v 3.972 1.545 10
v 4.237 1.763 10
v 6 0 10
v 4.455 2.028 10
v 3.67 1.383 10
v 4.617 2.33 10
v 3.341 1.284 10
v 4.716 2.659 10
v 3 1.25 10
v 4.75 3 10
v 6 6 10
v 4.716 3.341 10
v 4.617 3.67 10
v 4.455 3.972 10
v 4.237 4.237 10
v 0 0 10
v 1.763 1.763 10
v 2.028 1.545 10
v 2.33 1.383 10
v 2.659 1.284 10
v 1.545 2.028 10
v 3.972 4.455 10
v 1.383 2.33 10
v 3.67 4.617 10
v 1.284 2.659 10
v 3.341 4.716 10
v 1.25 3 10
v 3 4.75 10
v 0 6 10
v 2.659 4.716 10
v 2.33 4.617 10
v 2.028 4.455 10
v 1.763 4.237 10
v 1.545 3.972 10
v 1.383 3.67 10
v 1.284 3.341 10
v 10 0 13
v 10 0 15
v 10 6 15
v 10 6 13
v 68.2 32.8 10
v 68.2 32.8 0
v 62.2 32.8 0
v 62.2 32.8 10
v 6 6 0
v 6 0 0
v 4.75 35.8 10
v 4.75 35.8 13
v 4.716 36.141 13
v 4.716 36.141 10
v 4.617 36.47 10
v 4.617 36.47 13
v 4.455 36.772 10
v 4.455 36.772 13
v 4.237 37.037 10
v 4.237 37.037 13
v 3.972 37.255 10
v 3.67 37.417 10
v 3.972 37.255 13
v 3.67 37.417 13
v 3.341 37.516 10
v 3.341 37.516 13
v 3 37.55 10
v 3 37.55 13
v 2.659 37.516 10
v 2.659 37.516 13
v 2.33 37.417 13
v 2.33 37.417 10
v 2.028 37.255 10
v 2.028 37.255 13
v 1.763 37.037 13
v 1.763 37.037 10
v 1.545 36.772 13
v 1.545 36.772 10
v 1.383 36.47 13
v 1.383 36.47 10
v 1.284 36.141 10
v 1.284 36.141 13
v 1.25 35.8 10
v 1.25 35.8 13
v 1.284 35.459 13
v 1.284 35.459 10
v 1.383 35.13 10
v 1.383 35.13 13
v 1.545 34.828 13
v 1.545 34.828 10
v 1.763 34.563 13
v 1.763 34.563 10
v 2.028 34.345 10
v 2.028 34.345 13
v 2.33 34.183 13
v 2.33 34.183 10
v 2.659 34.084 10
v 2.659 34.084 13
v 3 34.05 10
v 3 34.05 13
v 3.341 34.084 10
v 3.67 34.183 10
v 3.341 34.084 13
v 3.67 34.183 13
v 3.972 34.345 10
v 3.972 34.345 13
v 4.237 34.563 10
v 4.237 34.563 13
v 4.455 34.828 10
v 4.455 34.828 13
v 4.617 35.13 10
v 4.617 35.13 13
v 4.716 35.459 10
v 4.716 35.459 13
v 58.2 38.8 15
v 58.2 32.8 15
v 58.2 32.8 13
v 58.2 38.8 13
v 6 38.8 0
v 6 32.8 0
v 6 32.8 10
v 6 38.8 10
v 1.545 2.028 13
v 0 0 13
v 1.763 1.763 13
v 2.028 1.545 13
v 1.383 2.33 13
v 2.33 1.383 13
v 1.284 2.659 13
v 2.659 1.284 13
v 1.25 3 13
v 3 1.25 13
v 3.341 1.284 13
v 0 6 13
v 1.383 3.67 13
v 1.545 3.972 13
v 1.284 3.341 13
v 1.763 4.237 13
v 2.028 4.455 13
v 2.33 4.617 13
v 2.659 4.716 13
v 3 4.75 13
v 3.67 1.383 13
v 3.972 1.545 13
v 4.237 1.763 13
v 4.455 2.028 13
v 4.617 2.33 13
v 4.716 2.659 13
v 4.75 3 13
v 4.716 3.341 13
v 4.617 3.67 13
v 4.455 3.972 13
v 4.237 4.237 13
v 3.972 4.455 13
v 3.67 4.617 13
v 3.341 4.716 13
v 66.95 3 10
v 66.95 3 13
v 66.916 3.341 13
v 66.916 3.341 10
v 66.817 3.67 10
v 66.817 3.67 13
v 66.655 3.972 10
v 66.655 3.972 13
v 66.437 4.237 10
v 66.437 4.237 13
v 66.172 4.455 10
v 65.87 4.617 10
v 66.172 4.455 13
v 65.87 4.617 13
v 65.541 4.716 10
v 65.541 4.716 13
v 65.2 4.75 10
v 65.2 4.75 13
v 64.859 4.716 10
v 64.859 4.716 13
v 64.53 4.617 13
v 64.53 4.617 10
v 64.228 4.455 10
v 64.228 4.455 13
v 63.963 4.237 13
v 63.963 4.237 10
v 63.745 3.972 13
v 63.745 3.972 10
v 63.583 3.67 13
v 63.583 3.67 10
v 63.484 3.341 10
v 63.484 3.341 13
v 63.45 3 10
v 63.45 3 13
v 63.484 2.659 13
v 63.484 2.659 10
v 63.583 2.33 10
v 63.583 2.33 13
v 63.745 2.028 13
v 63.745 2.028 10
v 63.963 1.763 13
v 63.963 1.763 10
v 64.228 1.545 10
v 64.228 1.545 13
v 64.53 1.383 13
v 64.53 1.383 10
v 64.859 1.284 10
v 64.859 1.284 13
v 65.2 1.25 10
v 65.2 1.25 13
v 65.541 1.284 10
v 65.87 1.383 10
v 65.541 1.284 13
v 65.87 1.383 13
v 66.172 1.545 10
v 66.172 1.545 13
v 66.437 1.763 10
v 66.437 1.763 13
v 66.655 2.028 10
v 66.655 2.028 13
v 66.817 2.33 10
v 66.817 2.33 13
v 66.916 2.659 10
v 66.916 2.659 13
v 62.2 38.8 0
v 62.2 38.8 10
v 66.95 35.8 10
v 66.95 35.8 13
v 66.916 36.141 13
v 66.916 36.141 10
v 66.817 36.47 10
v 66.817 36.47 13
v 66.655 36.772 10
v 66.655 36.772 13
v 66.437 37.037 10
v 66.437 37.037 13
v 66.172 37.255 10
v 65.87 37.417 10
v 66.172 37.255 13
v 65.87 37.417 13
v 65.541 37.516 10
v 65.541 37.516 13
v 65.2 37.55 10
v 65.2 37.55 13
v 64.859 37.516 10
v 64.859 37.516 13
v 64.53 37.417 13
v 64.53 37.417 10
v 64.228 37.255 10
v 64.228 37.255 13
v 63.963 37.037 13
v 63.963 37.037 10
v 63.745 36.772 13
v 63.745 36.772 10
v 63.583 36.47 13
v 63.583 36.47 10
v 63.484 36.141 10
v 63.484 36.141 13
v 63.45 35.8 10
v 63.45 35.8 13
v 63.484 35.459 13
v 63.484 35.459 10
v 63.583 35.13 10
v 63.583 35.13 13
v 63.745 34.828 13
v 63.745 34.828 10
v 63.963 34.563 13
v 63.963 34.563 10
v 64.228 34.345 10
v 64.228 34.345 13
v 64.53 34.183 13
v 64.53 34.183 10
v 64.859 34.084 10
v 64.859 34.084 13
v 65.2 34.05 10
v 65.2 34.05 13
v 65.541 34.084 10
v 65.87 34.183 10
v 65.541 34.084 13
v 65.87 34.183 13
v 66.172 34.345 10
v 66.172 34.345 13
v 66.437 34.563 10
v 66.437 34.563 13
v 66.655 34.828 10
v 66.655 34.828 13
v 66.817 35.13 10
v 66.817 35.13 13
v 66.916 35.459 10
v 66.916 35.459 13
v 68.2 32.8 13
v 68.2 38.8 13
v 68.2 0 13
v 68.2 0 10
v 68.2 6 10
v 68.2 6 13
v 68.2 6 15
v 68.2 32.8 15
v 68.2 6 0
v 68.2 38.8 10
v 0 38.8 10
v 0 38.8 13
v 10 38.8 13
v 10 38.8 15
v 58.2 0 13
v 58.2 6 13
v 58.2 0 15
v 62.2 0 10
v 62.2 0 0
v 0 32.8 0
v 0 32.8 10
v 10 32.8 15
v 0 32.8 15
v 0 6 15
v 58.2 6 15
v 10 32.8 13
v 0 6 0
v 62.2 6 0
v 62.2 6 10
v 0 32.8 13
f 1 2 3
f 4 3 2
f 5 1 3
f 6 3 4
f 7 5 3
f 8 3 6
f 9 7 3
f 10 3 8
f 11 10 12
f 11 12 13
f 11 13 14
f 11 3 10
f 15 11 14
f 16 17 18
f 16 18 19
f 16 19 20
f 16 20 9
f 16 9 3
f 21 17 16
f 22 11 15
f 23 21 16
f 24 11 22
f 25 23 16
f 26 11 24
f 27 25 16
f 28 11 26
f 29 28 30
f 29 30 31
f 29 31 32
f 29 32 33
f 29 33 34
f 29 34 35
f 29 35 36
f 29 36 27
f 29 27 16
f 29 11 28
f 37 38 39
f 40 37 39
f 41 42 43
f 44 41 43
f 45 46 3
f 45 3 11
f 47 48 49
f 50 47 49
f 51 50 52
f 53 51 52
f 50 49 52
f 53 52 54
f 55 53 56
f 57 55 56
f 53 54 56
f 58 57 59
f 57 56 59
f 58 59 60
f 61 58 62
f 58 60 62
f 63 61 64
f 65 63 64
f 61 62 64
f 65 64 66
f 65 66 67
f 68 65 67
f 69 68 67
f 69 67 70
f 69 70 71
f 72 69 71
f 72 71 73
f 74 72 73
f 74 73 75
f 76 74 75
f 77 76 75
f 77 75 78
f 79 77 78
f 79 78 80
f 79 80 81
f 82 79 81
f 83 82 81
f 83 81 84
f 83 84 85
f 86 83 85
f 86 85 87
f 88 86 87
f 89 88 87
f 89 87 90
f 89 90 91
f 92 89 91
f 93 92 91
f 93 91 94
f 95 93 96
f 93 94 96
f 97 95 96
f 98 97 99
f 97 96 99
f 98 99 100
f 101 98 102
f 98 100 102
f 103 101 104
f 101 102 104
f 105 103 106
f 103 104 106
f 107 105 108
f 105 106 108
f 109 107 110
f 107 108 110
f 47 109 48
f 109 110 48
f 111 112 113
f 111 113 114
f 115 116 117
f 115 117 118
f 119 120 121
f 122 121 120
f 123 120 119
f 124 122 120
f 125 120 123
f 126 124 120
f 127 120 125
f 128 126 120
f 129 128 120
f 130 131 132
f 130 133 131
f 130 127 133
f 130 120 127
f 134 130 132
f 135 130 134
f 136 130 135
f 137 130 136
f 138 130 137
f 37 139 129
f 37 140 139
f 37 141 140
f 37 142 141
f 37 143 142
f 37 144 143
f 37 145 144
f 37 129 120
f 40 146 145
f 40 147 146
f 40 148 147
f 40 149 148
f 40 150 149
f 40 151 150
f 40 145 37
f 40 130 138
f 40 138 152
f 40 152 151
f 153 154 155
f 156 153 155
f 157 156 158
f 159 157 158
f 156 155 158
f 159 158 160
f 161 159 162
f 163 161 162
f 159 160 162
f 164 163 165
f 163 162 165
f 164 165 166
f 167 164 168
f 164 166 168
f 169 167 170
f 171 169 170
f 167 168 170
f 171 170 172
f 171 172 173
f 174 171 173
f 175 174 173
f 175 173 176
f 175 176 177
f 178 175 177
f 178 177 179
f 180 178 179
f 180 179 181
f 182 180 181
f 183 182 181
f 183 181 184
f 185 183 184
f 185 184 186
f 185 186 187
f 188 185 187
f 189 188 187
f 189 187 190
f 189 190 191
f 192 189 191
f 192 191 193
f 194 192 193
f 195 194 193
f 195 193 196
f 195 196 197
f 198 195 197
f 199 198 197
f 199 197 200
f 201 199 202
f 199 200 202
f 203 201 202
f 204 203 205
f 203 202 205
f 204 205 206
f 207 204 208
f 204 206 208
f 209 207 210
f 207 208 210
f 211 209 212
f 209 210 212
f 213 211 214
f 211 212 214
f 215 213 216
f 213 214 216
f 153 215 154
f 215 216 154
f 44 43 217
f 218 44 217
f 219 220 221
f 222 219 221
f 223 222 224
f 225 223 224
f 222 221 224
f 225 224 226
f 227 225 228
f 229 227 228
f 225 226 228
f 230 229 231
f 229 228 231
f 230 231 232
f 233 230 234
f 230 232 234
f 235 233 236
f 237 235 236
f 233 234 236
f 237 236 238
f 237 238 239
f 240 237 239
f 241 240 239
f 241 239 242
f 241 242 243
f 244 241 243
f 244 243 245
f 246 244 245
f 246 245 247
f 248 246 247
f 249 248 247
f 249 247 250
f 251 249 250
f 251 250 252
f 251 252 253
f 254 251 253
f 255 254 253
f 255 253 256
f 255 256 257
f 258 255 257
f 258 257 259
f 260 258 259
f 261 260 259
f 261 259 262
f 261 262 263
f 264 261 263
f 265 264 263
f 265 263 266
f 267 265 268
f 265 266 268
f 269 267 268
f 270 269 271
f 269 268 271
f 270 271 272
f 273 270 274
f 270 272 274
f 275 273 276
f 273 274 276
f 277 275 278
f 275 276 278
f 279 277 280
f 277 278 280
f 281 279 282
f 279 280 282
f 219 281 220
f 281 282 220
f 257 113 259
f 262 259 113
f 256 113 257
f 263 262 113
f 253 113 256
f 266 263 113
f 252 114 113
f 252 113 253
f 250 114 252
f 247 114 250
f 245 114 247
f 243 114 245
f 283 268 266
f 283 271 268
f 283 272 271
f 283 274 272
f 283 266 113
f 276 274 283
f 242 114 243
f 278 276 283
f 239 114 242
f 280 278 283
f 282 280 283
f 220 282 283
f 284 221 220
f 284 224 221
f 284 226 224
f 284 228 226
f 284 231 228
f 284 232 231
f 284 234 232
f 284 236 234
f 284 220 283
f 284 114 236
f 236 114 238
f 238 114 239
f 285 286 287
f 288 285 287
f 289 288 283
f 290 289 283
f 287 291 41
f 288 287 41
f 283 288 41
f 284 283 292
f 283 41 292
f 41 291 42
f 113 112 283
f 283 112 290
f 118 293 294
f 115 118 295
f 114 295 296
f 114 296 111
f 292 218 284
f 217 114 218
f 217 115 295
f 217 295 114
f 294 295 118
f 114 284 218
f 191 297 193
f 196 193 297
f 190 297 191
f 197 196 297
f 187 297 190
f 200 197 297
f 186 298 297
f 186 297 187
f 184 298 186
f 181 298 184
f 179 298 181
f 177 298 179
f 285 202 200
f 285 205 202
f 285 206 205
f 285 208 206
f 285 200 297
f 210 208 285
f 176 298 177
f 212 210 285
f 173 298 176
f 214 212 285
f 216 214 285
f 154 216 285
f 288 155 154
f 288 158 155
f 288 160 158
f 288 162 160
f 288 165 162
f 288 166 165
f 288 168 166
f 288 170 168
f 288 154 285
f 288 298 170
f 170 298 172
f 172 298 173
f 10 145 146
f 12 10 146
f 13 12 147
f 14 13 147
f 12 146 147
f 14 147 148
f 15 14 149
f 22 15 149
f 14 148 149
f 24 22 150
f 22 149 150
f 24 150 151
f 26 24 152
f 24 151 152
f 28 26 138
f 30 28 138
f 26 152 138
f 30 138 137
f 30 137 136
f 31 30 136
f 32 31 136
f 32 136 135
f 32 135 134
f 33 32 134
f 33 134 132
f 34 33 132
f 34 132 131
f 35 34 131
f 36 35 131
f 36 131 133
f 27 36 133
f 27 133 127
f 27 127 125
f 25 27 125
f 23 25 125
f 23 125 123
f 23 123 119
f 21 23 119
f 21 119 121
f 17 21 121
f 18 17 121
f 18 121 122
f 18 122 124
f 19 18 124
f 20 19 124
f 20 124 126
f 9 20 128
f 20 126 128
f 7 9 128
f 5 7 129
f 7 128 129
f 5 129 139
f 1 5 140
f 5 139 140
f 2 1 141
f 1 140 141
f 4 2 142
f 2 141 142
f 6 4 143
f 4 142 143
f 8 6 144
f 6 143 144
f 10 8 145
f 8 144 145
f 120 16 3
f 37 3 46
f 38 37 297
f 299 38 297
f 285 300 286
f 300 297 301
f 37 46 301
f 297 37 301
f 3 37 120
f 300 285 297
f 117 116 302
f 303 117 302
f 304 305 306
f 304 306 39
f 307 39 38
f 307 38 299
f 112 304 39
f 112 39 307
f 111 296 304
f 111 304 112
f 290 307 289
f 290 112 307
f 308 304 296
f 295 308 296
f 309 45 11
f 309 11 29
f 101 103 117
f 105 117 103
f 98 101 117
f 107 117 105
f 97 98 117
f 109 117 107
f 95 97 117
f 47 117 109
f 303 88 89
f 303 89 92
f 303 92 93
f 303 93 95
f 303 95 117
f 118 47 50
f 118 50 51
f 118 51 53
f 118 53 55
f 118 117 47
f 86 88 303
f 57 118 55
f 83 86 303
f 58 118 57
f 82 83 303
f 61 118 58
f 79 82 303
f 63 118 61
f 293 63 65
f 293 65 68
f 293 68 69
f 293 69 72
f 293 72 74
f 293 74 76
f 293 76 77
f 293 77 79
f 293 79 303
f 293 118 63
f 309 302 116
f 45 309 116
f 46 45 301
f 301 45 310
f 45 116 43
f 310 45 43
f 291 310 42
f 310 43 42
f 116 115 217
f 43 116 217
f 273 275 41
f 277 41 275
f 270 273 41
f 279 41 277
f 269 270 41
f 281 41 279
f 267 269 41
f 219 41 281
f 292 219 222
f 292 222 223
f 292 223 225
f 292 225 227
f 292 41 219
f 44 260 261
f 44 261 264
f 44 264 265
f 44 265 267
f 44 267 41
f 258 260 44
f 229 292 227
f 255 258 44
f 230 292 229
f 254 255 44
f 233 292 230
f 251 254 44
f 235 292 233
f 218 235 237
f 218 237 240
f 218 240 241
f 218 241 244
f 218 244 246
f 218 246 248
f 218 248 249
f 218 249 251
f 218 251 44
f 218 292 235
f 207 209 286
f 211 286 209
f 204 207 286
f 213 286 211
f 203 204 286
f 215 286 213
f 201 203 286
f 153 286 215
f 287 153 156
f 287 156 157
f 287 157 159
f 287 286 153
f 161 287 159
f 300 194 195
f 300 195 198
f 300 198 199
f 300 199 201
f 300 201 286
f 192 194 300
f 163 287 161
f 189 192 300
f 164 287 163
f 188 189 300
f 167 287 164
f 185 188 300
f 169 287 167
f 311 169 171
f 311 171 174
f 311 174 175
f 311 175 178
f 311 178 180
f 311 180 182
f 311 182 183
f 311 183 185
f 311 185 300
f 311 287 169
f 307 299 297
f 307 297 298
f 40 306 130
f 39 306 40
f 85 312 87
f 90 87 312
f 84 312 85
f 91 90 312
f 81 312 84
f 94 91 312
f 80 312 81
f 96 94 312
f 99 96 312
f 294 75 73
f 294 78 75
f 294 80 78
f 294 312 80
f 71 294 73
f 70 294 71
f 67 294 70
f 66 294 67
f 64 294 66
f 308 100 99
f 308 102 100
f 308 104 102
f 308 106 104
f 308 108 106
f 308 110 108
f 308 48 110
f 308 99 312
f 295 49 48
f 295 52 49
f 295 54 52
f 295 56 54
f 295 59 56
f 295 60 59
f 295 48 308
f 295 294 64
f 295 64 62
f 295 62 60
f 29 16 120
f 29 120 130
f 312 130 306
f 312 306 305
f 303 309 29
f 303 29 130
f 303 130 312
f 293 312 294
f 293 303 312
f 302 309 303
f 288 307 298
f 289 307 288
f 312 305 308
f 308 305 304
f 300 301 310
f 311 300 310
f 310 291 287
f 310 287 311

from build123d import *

# Parameters (mm, degrees)
ESQUISSE1_W             = 68.2
ESQUISSE1_H             = 38.8
BOSS_EXTRU_2_DEPTH      = 15
ESQUISSE3_W             = 10
ESQUISSE3_H             = 6
ENL_V_MAT_EXTRU_1_DEPTH = 2
ESQUISSE4_R             = 1.75
ENL_V_MAT_EXTRU_2_DEPTH = 80.885417943
ESQUISSE6_W             = 6
ESQUISSE6_H             = 6
ENL_V_MAT_EXTRU_3_DEPTH = 10


with BuildPart() as part:
    # Esquisse1 → Boss.-Extru.2 (new body)
    with BuildSketch(Plane.XY):
        with Locations((34.1, 19.4)):
            Rectangle(ESQUISSE1_W, ESQUISSE1_H)
    extrude(amount=BOSS_EXTRU_2_DEPTH)

    # Esquisse3 → Enlèv. mat.-Extru.1 (cut)
    with BuildSketch(Plane.XY.offset(15)):
        with Locations((5, 35.8)):
            Rectangle(ESQUISSE3_W, ESQUISSE3_H)
        with Locations((5, 3)):
            Rectangle(ESQUISSE3_W, ESQUISSE3_H)
        with Locations((63.2, 3)):
            Rectangle(ESQUISSE3_W, ESQUISSE3_H)
        with Locations((63.2, 35.8)):
            Rectangle(ESQUISSE3_W, ESQUISSE3_H)
    extrude(amount=-ENL_V_MAT_EXTRU_1_DEPTH, mode=Mode.SUBTRACT)

    # Esquisse4 → Enlèv. mat.-Extru.2 (cut, through all)
    with BuildSketch(Plane.XY.offset(15)):
        with Locations((3, 35.8)):
            Circle(ESQUISSE4_R)
        with Locations((3, 3)):
            Circle(ESQUISSE4_R)
        with Locations((65.2, 35.8)):
            Circle(ESQUISSE4_R)
        with Locations((65.2, 3)):
            Circle(ESQUISSE4_R)
    extrude(amount=-ENL_V_MAT_EXTRU_2_DEPTH, mode=Mode.SUBTRACT)

    # Esquisse6 → Enlèv. mat.-Extru.3 (cut)
    with BuildSketch(Plane(origin=(0, 0, 0), x_dir=(-1, 0, 0), z_dir=(0, 0, -1))):
        with Locations((-65.2, 35.8)):
            Rectangle(ESQUISSE6_W, ESQUISSE6_H)
        with Locations((-3, 35.8)):
            Rectangle(ESQUISSE6_W, ESQUISSE6_H)
        with Locations((-3, 3)):
            Rectangle(ESQUISSE6_W, ESQUISSE6_H)
        with Locations((-65.2, 3)):
            Rectangle(ESQUISSE6_W, ESQUISSE6_H)
    extrude(amount=-ENL_V_MAT_EXTRU_3_DEPTH, mode=Mode.SUBTRACT)


solid = part.part
